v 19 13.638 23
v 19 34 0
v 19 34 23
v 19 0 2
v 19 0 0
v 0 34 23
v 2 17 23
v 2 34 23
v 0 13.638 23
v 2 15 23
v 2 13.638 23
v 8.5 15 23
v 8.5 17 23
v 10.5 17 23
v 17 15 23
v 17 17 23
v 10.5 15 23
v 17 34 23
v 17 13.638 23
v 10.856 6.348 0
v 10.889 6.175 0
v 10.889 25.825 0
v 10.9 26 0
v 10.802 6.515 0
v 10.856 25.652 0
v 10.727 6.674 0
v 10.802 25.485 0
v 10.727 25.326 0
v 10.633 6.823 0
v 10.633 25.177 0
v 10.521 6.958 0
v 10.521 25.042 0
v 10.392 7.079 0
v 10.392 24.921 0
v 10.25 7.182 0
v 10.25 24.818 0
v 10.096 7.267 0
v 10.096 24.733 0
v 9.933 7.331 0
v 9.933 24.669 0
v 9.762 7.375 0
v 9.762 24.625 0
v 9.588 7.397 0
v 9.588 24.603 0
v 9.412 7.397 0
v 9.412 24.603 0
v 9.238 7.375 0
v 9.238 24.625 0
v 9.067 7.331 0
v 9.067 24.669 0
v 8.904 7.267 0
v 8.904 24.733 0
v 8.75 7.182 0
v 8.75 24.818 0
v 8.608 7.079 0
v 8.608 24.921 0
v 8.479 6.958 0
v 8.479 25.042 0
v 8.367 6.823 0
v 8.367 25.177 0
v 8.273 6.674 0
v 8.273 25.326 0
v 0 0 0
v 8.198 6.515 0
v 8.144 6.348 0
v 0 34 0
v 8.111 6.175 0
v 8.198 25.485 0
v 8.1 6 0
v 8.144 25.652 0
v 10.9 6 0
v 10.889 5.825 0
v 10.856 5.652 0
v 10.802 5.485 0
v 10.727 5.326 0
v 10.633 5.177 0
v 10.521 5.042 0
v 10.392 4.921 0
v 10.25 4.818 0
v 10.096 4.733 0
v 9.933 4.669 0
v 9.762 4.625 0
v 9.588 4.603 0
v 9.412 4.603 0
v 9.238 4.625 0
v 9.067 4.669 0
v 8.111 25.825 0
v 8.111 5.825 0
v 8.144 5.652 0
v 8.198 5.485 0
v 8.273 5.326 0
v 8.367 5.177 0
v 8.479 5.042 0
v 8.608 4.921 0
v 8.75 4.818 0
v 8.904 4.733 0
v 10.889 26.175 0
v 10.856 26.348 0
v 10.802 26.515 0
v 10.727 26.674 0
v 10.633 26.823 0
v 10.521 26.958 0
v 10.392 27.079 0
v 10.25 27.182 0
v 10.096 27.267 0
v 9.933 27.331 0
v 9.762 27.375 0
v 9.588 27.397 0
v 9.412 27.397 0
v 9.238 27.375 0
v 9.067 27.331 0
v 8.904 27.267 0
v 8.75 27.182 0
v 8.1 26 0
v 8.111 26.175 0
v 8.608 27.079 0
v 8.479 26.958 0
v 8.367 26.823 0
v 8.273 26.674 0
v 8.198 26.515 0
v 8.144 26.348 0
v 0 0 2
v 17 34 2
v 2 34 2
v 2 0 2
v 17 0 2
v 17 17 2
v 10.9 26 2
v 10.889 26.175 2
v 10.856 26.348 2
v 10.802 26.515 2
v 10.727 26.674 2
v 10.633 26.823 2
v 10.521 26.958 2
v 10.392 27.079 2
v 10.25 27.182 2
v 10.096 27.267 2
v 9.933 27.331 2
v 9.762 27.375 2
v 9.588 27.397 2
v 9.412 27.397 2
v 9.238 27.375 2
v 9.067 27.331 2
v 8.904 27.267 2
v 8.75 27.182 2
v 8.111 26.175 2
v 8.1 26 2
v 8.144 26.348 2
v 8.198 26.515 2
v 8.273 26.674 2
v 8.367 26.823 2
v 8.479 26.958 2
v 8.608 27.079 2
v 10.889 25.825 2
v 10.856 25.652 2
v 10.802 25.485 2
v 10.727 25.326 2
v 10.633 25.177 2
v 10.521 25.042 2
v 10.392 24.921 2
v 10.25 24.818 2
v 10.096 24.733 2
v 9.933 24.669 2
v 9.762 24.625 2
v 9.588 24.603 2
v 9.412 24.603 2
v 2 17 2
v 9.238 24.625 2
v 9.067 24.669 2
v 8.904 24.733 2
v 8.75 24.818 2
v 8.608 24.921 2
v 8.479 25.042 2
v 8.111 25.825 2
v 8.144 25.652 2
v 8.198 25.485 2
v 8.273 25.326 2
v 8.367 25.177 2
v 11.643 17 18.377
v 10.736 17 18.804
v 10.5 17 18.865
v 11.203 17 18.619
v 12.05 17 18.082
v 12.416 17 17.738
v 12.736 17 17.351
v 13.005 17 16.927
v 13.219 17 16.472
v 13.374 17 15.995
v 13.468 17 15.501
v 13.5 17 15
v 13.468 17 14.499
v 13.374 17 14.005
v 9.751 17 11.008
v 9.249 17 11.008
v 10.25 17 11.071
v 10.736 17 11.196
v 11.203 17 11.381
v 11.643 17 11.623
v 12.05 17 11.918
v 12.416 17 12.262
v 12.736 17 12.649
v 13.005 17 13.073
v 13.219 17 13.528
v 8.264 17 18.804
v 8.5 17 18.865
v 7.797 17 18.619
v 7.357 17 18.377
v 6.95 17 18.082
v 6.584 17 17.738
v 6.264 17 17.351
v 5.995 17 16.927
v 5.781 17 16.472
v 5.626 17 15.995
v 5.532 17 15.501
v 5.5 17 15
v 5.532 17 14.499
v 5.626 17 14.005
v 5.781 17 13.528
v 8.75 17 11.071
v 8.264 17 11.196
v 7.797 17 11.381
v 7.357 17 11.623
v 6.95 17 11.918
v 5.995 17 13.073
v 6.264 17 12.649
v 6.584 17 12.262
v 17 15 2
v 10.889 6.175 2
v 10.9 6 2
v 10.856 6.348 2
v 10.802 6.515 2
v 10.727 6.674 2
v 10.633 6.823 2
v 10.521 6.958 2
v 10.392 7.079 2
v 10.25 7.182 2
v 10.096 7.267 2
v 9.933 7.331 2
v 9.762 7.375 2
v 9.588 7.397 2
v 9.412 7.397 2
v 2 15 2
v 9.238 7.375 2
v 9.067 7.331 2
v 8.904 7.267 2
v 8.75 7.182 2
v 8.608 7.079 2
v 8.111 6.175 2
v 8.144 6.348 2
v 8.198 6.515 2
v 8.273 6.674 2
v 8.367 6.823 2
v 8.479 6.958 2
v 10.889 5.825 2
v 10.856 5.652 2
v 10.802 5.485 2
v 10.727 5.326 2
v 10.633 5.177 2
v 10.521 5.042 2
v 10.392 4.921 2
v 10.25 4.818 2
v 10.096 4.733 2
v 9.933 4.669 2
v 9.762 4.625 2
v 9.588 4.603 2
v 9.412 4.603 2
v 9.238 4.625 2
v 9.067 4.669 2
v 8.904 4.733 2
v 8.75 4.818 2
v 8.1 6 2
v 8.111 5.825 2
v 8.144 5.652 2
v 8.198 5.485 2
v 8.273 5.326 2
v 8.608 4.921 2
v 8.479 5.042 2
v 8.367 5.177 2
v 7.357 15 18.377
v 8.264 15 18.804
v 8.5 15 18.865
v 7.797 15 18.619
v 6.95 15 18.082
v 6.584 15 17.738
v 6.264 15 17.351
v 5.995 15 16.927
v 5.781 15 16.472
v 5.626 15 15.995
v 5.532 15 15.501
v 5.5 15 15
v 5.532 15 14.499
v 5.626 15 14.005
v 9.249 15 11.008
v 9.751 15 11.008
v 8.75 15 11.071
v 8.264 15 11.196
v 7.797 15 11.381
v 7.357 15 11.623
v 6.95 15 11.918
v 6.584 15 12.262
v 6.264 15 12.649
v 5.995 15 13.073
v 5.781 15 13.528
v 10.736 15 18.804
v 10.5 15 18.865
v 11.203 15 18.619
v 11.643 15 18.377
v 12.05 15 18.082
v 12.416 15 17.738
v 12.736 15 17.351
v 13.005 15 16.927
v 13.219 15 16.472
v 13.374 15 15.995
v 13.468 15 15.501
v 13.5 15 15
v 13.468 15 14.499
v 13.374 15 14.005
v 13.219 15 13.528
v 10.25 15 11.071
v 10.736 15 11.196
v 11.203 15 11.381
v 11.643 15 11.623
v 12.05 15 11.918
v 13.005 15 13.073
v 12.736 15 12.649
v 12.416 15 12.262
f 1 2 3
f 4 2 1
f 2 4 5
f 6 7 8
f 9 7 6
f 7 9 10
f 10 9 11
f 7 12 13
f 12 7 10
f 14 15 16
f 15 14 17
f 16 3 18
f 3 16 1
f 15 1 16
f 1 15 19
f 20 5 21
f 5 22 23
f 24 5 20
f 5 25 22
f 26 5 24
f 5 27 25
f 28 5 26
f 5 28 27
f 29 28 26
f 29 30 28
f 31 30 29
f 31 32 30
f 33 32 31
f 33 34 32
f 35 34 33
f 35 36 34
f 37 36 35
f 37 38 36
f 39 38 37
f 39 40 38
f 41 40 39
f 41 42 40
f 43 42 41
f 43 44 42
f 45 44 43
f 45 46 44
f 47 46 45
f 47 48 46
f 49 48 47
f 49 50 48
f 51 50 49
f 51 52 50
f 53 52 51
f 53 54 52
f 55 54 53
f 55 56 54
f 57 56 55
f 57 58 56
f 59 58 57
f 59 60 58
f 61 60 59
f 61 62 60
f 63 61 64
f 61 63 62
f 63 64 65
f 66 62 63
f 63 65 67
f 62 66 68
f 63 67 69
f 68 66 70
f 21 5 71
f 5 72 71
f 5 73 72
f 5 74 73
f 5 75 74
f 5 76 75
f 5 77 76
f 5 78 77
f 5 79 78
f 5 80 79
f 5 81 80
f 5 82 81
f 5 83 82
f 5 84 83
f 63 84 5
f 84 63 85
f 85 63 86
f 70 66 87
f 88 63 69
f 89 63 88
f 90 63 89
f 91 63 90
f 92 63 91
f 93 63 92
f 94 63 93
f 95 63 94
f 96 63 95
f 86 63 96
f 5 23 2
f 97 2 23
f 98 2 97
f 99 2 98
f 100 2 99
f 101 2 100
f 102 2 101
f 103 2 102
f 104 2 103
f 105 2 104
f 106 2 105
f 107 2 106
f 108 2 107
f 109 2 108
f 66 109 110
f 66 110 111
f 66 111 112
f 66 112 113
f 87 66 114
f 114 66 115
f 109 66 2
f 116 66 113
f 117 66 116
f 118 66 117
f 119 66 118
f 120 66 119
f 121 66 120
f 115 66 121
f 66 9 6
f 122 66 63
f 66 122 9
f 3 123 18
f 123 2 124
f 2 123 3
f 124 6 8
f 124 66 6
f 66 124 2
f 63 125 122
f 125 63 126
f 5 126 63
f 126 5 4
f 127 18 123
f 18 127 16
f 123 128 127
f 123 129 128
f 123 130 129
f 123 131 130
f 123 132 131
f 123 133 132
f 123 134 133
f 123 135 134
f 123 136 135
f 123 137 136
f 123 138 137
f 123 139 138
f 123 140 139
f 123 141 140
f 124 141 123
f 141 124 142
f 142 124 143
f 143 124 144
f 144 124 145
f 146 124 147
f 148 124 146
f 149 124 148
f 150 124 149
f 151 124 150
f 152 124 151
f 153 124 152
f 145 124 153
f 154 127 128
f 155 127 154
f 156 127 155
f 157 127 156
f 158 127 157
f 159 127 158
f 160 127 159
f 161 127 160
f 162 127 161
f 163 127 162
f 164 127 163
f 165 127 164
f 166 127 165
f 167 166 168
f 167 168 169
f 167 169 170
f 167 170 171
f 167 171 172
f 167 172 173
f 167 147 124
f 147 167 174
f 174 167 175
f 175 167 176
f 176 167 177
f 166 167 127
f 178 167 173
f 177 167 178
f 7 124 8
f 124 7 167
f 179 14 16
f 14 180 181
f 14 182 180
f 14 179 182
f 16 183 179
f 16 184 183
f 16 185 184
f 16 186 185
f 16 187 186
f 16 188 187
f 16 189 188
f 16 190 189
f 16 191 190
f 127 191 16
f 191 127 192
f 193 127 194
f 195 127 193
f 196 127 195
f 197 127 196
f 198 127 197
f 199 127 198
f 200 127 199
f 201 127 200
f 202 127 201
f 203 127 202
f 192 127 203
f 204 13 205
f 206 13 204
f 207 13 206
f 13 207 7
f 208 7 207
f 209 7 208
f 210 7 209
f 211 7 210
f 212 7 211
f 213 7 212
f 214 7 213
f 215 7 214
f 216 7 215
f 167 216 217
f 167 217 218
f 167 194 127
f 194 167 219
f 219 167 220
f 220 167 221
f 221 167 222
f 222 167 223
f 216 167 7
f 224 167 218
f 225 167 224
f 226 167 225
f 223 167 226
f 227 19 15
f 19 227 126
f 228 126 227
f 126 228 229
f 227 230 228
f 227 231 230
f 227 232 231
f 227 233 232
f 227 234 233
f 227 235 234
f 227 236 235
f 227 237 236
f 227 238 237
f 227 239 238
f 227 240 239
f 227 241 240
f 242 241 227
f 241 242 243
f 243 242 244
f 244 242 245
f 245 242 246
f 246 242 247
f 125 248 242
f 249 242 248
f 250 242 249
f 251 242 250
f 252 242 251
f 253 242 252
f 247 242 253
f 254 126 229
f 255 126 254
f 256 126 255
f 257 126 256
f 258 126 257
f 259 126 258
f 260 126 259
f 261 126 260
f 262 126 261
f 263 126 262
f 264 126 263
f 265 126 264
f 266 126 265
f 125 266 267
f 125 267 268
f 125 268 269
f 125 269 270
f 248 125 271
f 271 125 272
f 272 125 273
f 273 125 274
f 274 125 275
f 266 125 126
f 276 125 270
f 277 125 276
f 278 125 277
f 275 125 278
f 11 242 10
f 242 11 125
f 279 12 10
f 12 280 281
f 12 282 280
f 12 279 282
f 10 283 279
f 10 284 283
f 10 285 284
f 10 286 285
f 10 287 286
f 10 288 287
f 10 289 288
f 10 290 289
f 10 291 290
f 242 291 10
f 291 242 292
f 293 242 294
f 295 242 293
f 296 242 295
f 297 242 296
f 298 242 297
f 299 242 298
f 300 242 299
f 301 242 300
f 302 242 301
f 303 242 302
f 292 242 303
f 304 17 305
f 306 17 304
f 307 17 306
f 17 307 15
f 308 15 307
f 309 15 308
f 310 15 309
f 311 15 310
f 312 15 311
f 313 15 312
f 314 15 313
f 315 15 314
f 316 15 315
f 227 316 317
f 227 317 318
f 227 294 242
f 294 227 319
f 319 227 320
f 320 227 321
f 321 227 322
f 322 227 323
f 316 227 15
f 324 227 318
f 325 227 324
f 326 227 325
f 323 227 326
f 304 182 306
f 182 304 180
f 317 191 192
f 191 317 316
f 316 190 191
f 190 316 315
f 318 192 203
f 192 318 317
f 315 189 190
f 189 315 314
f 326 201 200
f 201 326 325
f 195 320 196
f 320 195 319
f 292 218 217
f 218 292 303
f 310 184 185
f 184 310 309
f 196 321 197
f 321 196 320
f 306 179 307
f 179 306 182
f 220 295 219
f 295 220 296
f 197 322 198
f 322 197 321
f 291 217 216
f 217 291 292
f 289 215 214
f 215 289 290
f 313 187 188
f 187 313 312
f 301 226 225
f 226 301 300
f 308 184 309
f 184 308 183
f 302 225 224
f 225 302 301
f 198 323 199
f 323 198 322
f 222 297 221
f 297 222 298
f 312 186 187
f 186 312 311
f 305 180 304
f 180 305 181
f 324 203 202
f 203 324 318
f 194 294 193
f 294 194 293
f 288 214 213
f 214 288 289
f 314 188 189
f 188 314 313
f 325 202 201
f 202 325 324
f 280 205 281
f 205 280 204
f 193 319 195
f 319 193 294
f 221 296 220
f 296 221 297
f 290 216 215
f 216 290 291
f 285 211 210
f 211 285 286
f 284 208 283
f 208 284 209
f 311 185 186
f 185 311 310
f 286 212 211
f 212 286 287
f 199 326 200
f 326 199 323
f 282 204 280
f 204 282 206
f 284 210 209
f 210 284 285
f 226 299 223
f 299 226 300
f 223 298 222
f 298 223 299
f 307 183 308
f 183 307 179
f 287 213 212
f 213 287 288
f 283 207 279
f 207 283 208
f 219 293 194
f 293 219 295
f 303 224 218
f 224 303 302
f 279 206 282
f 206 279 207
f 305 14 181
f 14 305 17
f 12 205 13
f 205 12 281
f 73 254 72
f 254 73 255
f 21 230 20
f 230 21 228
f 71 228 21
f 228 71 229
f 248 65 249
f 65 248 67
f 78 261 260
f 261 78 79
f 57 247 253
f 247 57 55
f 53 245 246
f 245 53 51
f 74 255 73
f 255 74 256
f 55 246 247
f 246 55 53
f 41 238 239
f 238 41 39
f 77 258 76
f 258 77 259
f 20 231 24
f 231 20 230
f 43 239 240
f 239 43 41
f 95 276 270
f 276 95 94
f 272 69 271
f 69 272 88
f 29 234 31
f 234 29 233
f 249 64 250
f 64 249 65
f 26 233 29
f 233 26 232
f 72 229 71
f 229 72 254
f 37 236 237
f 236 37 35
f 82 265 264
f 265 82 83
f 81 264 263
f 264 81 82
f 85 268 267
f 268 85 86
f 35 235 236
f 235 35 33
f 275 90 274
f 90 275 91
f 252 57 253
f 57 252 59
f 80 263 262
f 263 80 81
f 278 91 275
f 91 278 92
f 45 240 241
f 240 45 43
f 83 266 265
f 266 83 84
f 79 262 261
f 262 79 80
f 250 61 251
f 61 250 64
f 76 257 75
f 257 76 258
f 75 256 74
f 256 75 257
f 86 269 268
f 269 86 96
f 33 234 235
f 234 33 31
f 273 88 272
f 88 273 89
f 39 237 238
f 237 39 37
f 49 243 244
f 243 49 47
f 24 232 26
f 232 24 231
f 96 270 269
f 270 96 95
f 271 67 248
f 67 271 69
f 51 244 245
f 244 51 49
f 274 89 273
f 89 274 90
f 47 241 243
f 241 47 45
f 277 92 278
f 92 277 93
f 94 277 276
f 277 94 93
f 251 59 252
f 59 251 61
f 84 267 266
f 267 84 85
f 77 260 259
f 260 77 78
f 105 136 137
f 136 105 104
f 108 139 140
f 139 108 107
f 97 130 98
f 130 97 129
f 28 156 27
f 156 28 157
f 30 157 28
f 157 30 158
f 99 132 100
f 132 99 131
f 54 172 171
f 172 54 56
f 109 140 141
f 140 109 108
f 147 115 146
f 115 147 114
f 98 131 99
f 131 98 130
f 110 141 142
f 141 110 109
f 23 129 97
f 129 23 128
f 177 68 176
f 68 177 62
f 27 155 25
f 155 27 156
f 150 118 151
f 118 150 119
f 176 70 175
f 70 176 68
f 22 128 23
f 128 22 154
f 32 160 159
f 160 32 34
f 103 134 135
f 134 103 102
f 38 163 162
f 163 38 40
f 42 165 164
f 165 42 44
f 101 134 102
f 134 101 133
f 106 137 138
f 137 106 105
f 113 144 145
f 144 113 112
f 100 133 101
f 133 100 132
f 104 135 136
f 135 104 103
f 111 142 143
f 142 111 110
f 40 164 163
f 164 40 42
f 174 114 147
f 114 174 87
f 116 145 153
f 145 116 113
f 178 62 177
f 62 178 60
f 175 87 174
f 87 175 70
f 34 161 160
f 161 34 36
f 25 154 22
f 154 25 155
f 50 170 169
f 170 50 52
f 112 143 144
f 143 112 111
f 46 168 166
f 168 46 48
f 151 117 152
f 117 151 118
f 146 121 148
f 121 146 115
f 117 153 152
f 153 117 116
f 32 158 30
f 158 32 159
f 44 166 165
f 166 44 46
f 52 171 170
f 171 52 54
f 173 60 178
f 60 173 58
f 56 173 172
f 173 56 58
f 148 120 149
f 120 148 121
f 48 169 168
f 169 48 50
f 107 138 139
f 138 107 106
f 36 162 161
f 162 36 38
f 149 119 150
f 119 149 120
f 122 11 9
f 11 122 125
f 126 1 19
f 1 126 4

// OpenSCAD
d=8;
t=2.8;

e=2;
l=15;
h=15;

$fn=50;


difference(){
  cube([l+2*e,2*l+2*e,h+d]);
  translate([e,l+e,e])cube([l,2*l,h+d]);
  translate([e,-l,e])cube([l,2*l,h+d]);
    
  translate([e+l/2,0,h])rotate([-90,0,0])cylinder(d=d, h=100);
  translate([e/2+l/2,0,h])cube([e,100,h]);
    
    
  translate([e+l/2,6,-h])rotate([0,0,0])cylinder(d=t, h=100);
  translate([e+l/2,26,-h])rotate([0,0,0])cylinder(d=t, h=100);
  
  translate([-e,0,e]) rotate([57,0,0]) cube([2*l,2*l,h+d]);
}
